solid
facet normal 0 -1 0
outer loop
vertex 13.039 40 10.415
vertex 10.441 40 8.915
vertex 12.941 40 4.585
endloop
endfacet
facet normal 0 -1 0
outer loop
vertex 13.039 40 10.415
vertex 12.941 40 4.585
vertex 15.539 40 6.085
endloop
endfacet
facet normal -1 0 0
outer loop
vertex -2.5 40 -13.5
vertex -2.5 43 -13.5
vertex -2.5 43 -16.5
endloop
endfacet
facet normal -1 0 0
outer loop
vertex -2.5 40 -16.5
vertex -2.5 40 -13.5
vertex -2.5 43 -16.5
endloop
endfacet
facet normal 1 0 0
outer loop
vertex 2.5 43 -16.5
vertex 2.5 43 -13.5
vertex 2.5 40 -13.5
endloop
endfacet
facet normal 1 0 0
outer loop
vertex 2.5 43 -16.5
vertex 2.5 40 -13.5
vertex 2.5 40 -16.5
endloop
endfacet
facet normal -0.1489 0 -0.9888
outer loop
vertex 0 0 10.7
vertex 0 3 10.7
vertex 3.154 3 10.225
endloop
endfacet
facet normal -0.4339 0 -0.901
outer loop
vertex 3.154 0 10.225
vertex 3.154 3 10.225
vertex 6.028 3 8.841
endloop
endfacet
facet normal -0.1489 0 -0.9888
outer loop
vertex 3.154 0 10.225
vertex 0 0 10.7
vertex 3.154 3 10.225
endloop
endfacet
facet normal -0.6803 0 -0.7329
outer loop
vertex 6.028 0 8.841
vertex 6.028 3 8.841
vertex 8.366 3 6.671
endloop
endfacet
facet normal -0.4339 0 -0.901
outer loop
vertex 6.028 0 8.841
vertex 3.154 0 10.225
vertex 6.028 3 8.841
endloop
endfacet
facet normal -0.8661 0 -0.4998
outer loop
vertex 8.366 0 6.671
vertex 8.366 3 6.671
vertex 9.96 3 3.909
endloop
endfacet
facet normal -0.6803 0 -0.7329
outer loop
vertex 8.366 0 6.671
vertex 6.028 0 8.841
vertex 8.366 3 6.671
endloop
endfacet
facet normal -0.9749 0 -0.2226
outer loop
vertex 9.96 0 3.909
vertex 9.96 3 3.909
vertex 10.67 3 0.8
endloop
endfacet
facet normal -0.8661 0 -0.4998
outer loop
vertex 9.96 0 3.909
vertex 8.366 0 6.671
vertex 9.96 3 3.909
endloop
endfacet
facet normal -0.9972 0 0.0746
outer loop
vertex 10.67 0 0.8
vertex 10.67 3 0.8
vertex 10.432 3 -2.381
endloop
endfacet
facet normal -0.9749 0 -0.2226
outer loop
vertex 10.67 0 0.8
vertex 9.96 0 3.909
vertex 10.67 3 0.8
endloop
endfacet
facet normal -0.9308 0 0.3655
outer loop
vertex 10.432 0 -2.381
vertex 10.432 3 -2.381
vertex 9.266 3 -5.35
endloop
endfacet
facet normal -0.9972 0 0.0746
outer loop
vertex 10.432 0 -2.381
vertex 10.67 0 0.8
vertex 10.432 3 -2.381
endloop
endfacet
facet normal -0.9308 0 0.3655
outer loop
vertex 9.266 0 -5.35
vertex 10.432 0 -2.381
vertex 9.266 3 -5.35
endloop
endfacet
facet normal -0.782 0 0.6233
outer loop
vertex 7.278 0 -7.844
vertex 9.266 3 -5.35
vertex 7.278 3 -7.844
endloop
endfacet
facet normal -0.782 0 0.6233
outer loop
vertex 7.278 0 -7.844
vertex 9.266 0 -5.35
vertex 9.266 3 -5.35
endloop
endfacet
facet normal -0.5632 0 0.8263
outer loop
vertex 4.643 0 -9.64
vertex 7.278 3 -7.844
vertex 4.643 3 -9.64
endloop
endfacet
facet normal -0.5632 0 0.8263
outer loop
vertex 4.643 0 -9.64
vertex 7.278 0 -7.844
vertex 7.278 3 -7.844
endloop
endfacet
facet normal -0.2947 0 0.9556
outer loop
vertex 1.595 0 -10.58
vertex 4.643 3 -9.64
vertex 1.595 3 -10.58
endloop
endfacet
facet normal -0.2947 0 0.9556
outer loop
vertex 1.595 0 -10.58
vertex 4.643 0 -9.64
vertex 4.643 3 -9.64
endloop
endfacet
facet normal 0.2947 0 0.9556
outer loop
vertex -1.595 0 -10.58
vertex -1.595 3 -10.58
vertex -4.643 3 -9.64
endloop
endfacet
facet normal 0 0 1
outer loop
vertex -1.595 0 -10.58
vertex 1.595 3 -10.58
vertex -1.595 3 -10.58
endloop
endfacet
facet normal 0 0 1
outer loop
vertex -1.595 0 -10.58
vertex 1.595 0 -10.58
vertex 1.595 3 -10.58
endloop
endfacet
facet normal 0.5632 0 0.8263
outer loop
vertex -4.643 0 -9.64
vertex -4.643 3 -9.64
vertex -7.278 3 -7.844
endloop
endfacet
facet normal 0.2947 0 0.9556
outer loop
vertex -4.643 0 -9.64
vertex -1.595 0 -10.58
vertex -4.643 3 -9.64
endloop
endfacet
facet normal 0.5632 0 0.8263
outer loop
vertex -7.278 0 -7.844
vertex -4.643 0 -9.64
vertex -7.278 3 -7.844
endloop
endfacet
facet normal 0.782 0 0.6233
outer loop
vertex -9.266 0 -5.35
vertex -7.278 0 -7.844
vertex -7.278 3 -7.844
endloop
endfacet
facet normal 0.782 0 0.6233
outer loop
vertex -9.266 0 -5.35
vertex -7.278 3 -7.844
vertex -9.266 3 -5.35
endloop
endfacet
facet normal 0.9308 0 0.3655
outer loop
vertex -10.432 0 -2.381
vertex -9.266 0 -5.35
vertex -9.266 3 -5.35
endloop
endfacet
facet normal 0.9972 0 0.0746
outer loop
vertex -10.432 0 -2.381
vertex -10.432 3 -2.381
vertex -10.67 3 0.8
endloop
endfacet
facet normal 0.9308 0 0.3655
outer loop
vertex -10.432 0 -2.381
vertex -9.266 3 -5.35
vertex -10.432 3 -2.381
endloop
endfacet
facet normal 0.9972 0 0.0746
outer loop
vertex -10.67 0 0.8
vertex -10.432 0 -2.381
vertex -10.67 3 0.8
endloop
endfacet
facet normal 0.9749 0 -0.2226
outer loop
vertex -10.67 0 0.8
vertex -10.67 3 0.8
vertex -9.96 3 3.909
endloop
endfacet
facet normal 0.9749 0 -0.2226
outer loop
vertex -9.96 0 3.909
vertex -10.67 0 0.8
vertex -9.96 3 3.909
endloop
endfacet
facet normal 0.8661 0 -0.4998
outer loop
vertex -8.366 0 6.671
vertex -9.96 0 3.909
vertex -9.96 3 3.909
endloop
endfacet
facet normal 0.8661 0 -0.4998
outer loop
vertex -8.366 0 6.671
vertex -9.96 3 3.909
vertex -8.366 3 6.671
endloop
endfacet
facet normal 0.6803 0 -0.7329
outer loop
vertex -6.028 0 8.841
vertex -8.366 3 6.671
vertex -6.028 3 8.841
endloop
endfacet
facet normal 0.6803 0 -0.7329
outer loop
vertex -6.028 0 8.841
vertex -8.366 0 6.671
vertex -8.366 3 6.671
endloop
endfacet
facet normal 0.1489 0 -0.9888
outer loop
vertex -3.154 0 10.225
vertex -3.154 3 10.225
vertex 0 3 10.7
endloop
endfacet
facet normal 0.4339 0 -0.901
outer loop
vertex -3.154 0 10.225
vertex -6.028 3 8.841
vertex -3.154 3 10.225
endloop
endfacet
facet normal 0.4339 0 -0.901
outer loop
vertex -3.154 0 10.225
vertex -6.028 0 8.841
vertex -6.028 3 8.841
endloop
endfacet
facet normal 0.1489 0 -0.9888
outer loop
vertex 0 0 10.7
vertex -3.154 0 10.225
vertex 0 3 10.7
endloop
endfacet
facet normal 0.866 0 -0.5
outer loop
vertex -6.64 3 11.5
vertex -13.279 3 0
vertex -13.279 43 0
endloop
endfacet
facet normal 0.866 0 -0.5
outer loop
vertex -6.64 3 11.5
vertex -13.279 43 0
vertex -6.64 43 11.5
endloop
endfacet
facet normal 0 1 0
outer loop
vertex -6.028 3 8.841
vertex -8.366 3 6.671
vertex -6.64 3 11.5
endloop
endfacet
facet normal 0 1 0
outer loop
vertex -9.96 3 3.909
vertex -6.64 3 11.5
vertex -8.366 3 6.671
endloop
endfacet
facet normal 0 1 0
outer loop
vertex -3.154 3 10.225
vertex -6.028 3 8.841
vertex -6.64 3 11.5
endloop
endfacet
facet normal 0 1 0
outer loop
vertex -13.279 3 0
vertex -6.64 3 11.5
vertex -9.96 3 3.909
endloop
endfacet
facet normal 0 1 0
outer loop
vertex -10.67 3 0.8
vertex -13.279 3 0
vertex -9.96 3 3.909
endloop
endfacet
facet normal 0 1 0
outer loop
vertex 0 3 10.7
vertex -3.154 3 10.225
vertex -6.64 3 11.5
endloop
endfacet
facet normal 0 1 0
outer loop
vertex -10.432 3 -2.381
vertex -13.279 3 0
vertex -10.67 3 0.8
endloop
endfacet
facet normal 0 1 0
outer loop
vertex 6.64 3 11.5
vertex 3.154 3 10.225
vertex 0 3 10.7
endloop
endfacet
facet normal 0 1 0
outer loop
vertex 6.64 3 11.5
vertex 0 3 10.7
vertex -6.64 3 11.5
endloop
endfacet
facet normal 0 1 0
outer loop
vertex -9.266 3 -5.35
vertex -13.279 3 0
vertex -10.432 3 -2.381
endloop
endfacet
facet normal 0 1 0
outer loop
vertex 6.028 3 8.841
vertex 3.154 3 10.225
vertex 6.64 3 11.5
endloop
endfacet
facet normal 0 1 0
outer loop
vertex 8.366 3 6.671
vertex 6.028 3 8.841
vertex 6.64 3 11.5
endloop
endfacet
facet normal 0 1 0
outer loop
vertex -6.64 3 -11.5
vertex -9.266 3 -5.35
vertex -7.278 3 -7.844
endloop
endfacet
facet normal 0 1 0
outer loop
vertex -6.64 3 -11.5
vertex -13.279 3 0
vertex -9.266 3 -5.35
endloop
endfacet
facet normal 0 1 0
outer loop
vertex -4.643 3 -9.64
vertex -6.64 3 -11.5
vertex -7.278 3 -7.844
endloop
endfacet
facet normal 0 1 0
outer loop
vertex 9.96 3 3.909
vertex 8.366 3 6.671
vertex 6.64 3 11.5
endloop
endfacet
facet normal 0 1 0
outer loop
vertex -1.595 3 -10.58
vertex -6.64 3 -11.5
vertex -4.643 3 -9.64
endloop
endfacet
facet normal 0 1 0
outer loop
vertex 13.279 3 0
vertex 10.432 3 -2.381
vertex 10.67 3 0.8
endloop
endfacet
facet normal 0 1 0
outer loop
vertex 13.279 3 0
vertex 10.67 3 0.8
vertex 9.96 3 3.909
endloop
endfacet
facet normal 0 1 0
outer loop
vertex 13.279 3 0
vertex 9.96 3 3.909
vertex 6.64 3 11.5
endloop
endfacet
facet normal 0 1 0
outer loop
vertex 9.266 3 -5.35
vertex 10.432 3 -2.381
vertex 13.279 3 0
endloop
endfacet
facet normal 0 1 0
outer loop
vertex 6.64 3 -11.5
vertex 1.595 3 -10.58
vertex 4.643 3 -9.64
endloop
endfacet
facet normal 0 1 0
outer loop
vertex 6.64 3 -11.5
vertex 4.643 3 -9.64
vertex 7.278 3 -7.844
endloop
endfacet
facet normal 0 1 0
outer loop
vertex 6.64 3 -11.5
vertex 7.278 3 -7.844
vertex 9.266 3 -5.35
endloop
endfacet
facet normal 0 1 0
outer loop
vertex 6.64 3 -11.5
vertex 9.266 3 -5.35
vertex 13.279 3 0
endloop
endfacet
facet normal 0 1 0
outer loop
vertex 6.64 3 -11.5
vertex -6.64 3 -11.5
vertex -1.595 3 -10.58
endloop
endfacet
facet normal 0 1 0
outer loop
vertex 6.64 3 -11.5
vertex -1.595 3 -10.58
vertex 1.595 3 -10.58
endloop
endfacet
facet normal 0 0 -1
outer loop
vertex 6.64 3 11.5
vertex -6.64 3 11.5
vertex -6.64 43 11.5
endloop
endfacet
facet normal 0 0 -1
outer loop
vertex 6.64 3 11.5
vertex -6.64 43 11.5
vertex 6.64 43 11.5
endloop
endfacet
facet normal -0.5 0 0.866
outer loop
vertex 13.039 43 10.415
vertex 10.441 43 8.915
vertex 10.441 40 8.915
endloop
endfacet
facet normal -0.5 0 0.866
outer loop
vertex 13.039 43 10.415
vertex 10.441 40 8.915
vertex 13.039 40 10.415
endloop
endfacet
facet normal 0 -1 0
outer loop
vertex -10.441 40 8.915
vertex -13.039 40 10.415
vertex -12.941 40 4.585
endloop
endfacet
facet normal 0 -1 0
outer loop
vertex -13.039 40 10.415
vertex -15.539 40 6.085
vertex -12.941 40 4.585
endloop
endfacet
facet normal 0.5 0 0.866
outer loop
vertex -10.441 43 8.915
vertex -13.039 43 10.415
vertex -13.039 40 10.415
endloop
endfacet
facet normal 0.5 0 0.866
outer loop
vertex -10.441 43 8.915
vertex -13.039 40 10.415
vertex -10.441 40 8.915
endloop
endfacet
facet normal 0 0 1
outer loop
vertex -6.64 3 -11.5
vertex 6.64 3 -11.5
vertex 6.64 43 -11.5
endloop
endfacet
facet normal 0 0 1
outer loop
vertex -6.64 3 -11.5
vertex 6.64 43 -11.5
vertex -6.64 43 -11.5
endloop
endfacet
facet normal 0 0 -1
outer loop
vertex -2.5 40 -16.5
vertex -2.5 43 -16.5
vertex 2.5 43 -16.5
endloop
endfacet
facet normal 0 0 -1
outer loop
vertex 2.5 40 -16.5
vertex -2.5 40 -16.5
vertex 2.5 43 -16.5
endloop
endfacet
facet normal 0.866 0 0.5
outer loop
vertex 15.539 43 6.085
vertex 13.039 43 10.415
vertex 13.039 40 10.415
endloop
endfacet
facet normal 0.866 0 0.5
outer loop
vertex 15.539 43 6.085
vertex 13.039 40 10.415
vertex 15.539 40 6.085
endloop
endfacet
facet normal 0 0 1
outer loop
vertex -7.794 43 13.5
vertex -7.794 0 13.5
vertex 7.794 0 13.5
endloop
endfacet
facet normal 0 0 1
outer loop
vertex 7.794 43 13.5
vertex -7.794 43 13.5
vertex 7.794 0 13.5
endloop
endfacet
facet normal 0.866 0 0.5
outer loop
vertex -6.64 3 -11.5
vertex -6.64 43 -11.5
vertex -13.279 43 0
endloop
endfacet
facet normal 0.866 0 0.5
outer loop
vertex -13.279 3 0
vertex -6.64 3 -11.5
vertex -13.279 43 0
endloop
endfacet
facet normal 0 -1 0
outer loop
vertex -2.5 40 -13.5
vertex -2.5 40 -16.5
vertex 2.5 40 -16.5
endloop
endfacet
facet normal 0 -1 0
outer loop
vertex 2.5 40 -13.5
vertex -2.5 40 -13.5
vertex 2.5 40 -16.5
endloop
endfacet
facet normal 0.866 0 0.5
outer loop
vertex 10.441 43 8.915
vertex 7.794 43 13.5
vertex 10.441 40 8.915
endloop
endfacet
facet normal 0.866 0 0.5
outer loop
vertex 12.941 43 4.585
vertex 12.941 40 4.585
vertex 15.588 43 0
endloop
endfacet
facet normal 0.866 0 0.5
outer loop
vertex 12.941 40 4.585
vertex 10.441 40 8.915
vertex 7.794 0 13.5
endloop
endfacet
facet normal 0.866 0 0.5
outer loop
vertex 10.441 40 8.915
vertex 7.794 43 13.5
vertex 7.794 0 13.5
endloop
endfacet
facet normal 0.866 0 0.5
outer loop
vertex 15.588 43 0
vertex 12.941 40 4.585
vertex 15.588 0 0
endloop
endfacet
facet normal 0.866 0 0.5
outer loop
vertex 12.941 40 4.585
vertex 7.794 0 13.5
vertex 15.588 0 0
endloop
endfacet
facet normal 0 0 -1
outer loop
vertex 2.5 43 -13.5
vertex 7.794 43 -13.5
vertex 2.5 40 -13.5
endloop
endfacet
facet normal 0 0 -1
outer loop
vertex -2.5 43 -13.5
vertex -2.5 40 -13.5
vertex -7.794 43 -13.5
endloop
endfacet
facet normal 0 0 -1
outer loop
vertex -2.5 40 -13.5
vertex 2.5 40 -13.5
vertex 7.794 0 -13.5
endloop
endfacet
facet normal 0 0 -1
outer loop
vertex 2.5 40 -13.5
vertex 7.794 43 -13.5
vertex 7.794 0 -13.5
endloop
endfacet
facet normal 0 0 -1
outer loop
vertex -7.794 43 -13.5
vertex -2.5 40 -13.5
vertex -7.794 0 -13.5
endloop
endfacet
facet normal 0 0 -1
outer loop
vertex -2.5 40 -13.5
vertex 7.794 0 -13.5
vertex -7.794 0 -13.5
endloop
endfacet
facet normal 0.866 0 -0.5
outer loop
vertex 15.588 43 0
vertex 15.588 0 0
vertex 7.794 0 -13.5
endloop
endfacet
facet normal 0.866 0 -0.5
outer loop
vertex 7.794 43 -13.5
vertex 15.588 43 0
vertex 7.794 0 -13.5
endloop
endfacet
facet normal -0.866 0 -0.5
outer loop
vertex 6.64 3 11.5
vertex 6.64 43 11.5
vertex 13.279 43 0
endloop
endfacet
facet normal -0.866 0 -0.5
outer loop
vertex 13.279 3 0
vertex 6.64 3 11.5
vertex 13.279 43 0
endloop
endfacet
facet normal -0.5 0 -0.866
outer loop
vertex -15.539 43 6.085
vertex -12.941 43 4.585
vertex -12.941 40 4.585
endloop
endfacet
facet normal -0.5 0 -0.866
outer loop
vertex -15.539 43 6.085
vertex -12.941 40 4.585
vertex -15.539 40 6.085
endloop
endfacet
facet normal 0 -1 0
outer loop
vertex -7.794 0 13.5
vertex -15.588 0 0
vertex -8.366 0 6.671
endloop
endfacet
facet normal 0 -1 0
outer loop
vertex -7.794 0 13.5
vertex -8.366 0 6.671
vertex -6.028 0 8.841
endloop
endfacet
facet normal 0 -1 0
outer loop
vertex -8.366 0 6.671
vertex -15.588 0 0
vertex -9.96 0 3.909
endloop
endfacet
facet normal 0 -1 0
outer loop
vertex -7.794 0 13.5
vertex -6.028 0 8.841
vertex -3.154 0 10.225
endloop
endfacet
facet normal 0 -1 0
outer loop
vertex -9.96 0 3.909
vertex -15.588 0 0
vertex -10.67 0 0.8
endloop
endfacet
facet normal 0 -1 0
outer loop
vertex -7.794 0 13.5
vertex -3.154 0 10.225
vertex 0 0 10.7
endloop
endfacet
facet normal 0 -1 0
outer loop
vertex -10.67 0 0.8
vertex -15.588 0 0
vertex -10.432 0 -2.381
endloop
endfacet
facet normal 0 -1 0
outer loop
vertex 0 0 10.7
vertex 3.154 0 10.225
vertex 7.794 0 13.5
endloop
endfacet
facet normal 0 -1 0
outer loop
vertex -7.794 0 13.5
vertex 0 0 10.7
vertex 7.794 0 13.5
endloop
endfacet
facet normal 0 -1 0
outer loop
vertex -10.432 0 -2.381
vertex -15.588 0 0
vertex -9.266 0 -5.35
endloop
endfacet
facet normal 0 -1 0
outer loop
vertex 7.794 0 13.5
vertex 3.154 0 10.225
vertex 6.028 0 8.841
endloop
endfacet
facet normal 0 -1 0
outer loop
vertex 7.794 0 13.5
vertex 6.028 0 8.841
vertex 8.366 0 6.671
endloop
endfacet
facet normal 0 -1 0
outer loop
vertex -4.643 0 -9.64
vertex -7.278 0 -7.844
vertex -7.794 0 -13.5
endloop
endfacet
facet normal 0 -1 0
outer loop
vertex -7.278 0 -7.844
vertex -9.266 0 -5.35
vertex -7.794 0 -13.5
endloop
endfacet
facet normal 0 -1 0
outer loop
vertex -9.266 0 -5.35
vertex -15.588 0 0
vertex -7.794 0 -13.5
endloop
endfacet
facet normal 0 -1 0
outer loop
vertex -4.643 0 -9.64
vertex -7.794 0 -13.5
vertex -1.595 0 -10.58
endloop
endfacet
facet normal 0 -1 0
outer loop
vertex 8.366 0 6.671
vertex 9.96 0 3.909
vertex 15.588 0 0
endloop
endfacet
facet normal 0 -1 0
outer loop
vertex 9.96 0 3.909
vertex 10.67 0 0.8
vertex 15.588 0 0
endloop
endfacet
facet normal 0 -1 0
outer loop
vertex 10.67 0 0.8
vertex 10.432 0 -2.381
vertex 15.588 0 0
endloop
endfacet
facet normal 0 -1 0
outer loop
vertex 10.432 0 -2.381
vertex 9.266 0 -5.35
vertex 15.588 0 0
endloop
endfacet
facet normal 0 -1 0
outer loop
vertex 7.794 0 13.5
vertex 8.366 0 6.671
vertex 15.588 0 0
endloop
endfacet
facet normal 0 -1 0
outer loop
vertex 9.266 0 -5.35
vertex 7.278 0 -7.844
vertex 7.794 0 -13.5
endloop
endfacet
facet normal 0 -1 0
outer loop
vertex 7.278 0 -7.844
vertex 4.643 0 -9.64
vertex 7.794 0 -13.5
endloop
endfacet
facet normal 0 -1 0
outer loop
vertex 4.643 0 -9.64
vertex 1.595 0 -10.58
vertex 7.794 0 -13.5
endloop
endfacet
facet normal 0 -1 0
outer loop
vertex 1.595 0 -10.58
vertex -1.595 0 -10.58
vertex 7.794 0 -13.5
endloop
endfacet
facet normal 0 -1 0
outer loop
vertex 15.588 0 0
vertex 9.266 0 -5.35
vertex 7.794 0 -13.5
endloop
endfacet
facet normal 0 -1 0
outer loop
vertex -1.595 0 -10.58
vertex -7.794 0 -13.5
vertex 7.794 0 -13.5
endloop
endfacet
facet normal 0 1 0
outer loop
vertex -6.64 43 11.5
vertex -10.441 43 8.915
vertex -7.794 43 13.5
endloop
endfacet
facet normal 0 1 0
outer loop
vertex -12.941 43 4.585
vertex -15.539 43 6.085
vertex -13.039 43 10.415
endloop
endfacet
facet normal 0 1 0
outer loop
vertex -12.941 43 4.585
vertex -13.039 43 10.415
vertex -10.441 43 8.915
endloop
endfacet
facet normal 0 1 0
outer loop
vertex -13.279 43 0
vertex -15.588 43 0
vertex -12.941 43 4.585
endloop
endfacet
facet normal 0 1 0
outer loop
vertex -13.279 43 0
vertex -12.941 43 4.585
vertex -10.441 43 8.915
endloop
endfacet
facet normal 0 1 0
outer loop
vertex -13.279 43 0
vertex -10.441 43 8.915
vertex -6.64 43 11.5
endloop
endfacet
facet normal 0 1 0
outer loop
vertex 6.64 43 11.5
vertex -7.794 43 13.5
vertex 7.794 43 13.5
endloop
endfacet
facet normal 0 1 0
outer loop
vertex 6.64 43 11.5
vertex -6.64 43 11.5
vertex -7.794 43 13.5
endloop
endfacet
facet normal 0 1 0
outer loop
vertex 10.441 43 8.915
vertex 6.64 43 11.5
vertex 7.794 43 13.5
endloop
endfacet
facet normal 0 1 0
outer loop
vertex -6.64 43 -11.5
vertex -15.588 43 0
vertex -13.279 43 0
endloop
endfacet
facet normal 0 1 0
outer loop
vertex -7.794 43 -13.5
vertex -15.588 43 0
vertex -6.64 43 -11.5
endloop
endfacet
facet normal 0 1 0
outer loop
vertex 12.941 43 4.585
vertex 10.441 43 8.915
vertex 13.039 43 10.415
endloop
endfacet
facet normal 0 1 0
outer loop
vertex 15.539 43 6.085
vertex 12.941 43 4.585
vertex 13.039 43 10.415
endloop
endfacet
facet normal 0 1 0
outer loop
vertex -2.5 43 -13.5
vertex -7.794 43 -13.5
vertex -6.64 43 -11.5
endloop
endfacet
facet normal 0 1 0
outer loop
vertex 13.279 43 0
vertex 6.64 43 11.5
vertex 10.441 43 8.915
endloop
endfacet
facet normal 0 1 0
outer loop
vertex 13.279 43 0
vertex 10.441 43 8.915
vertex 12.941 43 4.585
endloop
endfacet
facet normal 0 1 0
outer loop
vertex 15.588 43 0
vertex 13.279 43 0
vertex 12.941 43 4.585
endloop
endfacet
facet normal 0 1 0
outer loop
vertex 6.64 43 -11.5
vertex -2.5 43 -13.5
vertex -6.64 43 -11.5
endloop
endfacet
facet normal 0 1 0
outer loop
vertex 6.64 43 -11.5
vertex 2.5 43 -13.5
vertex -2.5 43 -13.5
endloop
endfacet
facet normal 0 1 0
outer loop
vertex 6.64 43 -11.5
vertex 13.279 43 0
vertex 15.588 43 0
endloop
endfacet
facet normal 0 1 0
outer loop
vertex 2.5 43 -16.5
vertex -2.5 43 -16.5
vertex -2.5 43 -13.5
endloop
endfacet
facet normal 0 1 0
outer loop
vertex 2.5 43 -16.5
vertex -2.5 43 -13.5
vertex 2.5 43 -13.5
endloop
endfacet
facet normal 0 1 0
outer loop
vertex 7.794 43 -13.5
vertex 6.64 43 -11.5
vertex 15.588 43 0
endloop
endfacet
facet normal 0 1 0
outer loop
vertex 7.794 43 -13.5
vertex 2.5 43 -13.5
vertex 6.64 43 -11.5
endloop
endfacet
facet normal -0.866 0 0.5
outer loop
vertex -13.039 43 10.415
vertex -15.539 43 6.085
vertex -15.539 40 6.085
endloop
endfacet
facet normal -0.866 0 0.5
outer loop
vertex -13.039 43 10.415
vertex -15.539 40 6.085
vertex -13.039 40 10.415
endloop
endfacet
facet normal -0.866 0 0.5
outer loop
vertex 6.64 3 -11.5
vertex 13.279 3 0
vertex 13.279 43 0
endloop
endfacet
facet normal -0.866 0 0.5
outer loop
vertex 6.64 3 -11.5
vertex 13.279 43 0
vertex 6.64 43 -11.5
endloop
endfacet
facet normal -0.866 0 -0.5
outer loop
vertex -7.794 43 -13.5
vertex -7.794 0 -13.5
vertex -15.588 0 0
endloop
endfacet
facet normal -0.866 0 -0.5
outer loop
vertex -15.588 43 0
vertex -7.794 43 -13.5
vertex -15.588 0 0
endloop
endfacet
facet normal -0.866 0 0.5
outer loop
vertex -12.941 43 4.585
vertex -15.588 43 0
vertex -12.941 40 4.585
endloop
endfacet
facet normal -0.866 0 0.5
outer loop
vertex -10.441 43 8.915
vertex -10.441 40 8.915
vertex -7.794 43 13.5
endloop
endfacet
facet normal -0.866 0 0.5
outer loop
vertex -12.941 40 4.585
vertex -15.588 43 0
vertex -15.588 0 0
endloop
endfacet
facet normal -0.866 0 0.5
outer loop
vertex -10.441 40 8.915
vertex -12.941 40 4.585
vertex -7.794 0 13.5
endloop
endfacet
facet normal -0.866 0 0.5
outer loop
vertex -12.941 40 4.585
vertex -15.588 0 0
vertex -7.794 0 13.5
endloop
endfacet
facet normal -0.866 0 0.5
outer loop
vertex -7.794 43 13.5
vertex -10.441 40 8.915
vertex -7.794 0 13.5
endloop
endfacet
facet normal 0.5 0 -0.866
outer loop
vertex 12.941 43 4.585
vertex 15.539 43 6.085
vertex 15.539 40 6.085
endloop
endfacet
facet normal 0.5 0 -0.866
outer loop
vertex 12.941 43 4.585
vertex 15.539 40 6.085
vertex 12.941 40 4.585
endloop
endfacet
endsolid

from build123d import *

# Parameters (mm, degrees)
SKETCH1_R           = 10.7
BOSS_EXTRUDE1_DEPTH = 43
CUT_EXTRUDE1_DEPTH  = 40
SKETCH3_W           = 5
SKETCH3_H           = 3
BOSS_EXTRUDE2_DEPTH = 3


with BuildPart() as part:
    # Sketch1 → Boss-Extrude1 (new body)
    with BuildSketch(Plane(origin=(0, 0, 0), x_dir=(1, 0, 0), z_dir=(0, 1, 0))):
        Polygon((15.588457268, 0), (7.794228634, 13.5), (-7.794228634, 13.5), (-15.588457268, 0), (-7.794228634, -13.5), (7.794228634, -13.5), align=None)
        with Locations(Location((0, 0, 0), (0, 0, 270))):
            Circle(SKETCH1_R, mode=Mode.SUBTRACT)
    extrude(amount=BOSS_EXTRUDE1_DEPTH)

    # Sketch2 → Cut-Extrude1 (cut)
    with BuildSketch(Plane(origin=(0, 43, 0), x_dir=(1, 0, 0), z_dir=(0, 1, 0))):
        Polygon((13.279056191, 0), (6.639528096, 11.5), (-6.639528096, 11.5), (-13.279056191, 0), (-6.639528096, -11.5), (6.639528096, -11.5), align=None)
    extrude(amount=-CUT_EXTRUDE1_DEPTH, mode=Mode.SUBTRACT)

    # Sketch3 → Boss-Extrude2 (add)
    with BuildSketch(Plane(origin=(0, 43, 0), x_dir=(1, 0, 0), z_dir=(0, 1, 0))):
        Polygon((15.539419162, -6.084936491), (12.941342951, -4.584936491), (10.441342951, -8.915063509), (13.039419162, -10.415063509), align=None)
        with Locations((0, 15)):
            Rectangle(SKETCH3_W, SKETCH3_H)
        Polygon((-13.039419162, -10.415063509), (-10.441342951, -8.915063509), (-12.941342951, -4.584936491), (-15.539419162, -6.084936491), align=None)
    extrude(amount=-BOSS_EXTRUDE2_DEPTH)


solid = part.part
